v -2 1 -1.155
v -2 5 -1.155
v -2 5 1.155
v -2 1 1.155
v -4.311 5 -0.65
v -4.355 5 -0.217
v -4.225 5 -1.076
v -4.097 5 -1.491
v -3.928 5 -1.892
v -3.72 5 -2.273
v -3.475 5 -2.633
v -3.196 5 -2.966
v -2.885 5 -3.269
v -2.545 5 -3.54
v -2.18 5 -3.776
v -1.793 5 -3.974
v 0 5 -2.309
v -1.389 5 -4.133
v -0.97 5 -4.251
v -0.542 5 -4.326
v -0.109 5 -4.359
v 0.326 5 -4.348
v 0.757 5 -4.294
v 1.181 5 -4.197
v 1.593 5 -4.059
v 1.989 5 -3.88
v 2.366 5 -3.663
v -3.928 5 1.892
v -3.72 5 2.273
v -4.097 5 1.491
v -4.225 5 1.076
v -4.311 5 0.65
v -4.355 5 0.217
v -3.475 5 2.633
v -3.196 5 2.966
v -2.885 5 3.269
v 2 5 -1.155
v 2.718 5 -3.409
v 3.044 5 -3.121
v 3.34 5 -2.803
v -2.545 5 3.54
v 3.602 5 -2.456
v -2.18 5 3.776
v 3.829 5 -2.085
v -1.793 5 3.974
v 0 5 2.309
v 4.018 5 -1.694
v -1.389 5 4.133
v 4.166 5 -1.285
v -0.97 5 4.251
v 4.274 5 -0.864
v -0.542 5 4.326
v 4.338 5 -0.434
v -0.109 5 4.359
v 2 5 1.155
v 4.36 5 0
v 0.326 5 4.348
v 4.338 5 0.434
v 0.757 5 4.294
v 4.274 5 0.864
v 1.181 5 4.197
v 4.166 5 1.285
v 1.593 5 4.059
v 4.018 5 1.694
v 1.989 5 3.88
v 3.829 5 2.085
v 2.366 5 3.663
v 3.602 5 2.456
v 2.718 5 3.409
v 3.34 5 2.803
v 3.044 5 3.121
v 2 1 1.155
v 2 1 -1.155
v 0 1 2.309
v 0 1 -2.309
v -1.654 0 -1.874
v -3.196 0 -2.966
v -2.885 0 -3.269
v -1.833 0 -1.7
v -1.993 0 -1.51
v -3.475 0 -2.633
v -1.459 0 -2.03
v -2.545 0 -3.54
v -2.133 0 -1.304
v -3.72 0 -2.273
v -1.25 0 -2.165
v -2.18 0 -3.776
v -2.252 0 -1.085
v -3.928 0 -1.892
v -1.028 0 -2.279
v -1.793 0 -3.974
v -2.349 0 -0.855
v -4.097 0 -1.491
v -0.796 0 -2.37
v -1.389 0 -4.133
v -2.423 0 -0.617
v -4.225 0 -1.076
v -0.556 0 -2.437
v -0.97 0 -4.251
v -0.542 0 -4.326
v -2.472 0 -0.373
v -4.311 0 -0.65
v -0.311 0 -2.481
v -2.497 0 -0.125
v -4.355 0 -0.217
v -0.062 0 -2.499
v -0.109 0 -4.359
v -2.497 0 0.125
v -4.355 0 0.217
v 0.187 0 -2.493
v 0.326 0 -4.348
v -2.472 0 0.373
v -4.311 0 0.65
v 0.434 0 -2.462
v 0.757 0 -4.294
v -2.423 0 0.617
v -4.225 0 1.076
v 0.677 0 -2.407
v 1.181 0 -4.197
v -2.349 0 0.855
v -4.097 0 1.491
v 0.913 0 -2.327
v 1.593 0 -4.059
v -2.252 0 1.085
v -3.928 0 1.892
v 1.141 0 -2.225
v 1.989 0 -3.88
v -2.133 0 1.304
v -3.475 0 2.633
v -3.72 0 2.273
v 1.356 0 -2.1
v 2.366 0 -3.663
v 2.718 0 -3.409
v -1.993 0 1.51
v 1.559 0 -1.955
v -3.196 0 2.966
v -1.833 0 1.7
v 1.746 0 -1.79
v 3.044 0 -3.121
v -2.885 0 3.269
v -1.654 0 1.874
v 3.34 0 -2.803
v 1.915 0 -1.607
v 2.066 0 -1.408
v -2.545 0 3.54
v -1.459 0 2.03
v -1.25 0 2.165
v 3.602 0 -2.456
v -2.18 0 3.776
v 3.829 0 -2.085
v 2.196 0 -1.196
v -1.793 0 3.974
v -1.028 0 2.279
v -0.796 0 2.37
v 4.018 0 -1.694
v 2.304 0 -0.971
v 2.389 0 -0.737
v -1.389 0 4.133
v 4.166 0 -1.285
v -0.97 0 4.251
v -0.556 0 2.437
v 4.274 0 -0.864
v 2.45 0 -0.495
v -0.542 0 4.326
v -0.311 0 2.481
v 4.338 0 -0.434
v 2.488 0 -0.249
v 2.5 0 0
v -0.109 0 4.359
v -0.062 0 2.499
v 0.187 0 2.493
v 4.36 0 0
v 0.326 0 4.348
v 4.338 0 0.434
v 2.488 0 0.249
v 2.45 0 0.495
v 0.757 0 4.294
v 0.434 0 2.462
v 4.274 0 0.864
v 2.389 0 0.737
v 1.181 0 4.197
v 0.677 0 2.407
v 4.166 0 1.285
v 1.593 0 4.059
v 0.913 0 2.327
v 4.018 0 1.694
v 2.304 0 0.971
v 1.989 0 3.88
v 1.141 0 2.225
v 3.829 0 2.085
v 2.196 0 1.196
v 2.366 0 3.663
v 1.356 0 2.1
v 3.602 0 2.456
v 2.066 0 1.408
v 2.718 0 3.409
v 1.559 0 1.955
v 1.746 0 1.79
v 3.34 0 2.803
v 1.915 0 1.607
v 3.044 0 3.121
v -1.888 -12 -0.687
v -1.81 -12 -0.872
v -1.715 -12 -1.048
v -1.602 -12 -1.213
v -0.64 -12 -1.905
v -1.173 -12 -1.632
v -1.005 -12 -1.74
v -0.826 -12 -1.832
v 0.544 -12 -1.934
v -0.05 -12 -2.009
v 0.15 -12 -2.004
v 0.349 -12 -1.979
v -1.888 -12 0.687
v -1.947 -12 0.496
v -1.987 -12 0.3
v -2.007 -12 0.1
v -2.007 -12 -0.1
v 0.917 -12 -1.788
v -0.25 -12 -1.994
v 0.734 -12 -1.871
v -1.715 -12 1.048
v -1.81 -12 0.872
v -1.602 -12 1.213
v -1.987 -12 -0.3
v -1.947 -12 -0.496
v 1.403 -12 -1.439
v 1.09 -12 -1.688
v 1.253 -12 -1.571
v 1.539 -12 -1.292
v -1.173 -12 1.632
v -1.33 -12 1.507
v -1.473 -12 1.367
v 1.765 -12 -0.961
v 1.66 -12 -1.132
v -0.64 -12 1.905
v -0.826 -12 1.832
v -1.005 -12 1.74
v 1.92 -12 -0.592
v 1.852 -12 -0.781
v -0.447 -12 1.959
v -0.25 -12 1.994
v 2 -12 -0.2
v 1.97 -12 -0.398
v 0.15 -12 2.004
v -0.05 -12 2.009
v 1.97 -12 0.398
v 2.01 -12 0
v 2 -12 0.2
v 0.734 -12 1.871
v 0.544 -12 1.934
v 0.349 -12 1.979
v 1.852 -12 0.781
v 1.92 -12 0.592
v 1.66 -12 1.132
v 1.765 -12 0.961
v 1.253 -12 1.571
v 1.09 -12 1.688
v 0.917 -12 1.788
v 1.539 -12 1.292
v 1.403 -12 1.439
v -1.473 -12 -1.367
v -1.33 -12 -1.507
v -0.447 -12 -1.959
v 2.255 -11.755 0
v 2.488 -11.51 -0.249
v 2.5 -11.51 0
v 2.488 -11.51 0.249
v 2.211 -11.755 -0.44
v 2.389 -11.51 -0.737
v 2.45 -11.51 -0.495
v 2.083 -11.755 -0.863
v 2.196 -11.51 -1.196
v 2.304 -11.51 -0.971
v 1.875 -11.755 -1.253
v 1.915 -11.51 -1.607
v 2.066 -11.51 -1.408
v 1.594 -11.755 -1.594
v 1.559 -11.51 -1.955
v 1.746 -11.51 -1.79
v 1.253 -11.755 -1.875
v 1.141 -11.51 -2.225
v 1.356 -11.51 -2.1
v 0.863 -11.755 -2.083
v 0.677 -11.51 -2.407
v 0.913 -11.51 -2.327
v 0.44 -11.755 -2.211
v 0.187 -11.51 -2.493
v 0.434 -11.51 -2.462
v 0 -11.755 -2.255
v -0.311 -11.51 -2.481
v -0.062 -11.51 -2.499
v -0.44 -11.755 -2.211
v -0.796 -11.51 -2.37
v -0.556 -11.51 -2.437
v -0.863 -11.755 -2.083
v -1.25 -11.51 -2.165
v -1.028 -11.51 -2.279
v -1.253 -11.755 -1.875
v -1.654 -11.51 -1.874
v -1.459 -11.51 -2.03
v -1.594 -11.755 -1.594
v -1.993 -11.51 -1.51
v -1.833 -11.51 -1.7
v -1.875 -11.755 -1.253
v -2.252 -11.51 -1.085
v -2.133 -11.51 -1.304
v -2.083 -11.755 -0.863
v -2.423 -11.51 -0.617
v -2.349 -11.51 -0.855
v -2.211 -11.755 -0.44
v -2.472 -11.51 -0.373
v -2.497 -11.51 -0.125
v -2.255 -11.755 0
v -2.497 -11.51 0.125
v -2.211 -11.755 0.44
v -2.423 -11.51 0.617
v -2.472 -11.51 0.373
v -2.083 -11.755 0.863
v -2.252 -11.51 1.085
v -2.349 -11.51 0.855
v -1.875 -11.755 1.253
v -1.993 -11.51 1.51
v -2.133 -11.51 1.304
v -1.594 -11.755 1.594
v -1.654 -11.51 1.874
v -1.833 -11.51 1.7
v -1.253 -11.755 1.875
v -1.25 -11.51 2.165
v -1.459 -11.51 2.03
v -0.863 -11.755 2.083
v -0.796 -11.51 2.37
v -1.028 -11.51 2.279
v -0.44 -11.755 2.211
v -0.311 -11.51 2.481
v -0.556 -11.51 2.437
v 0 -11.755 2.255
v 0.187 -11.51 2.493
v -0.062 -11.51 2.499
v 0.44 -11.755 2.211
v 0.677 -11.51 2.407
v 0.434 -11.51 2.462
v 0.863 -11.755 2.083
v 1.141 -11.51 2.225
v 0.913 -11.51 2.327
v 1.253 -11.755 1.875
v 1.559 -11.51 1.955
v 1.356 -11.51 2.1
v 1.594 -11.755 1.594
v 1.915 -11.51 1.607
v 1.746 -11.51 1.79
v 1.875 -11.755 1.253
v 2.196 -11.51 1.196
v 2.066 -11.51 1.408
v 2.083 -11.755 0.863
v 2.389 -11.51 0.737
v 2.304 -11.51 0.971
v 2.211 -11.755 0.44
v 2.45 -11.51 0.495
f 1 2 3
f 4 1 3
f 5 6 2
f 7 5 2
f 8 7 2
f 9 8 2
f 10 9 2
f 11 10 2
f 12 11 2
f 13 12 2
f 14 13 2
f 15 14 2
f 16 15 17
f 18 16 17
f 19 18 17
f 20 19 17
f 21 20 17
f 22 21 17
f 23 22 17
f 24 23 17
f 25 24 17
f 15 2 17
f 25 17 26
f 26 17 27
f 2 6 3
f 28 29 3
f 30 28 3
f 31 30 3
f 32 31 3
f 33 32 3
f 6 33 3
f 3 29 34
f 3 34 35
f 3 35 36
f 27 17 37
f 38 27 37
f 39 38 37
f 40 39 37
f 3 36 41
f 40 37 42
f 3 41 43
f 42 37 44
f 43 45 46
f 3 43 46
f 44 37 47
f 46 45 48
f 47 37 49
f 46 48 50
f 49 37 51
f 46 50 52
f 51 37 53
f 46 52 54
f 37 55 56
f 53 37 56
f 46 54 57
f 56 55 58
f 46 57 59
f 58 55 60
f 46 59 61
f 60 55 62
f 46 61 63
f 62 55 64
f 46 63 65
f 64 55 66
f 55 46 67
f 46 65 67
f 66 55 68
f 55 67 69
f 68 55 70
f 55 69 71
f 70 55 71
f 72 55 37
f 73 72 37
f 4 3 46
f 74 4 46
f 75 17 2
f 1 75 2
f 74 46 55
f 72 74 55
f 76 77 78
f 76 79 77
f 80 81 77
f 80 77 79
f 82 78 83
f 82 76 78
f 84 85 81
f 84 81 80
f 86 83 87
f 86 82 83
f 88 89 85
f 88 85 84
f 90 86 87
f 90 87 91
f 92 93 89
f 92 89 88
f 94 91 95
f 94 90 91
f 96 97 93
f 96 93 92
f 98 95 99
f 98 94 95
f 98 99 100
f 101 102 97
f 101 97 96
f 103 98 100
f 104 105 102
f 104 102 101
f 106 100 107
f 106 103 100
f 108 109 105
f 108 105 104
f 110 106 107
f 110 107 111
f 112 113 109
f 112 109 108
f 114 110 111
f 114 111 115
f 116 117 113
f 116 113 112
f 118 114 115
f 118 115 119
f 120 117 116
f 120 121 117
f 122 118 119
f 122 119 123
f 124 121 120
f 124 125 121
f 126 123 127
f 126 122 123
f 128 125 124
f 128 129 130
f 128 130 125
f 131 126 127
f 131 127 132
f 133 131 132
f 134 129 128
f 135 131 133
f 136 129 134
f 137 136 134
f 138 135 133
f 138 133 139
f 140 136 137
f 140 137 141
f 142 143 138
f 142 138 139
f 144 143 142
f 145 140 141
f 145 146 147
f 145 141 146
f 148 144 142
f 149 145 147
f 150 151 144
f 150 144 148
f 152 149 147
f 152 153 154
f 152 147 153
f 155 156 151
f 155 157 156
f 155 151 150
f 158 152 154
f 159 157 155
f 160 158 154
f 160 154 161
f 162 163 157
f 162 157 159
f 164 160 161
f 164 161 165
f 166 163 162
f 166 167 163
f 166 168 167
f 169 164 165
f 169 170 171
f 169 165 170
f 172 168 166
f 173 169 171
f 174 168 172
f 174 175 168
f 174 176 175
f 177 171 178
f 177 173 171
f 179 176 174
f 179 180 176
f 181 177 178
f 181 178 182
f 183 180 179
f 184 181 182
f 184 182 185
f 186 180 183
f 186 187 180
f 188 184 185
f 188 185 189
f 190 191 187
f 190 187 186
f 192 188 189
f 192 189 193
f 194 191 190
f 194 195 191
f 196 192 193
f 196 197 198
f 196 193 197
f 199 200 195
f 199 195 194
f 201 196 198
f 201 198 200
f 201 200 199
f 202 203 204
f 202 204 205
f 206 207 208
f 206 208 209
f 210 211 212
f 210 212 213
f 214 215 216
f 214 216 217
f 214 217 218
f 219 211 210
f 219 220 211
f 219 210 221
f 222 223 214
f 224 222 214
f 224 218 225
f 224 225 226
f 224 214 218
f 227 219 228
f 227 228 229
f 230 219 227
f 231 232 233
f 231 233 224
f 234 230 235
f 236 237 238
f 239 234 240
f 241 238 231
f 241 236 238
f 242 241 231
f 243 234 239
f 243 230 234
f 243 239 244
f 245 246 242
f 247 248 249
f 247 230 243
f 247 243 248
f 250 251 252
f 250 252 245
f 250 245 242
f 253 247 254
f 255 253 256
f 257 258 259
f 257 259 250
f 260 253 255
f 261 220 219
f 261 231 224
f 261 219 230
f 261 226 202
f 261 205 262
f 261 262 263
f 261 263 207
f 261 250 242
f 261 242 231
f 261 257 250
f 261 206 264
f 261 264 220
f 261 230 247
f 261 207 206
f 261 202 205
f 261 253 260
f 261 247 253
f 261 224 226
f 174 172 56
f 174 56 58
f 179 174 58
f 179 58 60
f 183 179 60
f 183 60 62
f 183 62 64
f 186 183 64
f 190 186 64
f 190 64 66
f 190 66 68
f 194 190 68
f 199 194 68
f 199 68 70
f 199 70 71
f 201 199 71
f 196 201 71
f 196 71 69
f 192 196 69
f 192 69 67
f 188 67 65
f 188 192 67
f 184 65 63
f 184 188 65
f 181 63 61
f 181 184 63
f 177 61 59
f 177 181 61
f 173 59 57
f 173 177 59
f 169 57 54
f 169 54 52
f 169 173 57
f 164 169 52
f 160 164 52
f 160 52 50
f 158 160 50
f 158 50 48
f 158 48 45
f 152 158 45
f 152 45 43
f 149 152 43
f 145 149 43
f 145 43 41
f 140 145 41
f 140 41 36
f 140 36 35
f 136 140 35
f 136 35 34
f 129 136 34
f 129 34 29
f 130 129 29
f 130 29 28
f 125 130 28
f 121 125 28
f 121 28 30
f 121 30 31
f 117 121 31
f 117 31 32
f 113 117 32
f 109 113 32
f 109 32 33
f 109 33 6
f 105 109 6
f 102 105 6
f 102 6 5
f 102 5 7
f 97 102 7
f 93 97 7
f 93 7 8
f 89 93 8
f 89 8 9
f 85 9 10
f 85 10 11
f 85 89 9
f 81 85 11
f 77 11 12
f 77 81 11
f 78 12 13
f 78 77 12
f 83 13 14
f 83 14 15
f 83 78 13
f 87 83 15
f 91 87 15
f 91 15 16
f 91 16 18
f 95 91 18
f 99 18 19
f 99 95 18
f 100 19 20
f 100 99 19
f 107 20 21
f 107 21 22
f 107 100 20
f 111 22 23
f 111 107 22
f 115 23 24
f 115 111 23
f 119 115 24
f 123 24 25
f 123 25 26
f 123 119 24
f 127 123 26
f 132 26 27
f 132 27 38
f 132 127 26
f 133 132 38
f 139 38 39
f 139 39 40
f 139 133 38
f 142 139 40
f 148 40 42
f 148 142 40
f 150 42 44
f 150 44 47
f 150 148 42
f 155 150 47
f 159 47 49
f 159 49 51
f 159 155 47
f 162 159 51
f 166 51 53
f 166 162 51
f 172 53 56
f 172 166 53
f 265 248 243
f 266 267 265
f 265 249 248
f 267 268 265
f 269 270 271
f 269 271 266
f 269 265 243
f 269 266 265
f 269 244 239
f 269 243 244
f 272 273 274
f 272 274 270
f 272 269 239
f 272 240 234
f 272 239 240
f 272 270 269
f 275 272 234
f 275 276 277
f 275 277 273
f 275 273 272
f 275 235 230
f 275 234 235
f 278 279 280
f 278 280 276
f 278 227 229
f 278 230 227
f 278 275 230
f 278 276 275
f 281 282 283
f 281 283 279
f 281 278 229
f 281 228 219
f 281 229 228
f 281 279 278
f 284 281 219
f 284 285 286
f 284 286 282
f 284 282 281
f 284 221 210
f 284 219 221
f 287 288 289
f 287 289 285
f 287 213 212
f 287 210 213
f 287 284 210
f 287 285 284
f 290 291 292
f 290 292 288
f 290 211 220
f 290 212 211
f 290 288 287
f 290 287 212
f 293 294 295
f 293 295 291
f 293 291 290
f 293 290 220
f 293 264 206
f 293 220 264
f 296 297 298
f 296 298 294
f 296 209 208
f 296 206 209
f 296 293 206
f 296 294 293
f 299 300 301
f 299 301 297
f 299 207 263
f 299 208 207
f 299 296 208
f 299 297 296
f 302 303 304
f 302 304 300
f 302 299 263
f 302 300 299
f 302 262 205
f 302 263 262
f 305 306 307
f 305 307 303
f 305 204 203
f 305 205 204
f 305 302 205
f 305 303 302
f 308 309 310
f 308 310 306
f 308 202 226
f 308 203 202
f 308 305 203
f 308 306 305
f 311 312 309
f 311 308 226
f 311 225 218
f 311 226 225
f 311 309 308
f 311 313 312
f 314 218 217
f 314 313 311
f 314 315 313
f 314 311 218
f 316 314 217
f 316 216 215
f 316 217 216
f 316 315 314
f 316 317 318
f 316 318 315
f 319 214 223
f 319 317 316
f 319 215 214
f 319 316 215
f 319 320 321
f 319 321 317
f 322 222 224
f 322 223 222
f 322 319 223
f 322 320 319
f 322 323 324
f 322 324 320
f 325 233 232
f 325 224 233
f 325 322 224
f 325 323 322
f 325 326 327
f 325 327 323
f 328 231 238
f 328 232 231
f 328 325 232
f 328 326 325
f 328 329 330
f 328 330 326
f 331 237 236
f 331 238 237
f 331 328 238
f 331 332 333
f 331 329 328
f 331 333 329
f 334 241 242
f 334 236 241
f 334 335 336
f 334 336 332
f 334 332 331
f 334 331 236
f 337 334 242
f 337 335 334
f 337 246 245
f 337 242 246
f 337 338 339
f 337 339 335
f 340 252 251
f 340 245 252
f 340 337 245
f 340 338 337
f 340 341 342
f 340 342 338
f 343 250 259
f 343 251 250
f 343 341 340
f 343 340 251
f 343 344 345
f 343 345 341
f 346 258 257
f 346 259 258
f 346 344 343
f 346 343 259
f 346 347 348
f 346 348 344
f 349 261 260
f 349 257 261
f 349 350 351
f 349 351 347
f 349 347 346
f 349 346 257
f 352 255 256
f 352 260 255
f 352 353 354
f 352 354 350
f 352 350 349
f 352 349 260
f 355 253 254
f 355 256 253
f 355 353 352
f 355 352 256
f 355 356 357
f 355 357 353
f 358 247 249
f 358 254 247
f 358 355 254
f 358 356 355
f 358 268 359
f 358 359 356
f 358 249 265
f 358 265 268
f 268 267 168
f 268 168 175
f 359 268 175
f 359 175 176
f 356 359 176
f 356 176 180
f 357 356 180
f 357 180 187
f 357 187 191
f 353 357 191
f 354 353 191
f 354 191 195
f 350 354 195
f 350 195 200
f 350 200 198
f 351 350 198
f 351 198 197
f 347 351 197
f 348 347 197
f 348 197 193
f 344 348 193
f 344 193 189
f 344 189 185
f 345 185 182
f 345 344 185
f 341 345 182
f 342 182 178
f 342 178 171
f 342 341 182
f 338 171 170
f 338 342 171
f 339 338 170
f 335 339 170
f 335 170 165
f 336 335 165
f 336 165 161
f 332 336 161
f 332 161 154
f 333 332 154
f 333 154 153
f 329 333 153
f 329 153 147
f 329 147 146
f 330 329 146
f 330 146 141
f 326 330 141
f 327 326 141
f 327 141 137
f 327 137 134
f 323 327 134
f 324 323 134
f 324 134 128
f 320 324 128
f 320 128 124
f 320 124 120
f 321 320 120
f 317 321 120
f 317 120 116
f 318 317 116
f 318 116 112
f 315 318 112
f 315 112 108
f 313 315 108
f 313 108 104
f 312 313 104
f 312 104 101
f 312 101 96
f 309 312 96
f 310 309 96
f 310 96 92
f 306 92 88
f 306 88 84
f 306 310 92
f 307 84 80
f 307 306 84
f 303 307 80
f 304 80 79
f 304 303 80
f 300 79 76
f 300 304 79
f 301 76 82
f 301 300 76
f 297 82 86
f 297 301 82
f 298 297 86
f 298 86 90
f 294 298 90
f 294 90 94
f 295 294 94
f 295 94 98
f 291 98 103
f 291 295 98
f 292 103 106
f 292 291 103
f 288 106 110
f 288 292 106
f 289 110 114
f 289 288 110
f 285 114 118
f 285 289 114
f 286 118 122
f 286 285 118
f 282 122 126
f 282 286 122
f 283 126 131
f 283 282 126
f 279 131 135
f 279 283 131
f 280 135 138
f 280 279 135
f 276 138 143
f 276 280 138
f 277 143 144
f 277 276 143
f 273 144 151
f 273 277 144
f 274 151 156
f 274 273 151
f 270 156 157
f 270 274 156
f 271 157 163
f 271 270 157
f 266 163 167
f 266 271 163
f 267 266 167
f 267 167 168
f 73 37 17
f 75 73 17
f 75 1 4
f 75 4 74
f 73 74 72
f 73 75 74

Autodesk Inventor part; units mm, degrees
sketch "Sketch_1" plane through (0, 0, 0) normal (0, 0, 1) x (1, 0, 0)
  line L0 (0, -12) -> (0, 5)
  line L1 (0, 5) -> (4.36, 5)
  line L2 (4.36, 5) -> (4.36, 0)
  line L3 (4.36, 0) -> (2.5, 0)
  line L4 (2.5, 0) -> (2.5, -11.5095)
  line L5 (2.5, -11.5095) -> (2.0095, -12)
  line L6 (2.0095, -12) -> (0, -12)
  line L7 (0, -12) -> (0, 5)
revolve "Revolution1" add sketch "Sketch_1" angle 360 about axis through (0, -12, 0) along (0, -1, 0)
thread "Thread1" size "M5x0.8" class "6g" standard "ISO Metric profile" length 10.5095
sketch "Sketch_2" plane through (0, 5, 0) normal (0, 1, 0) x (1, 0, 0)
  line L0 (-2, -1.1547) -> (0, -2.3094)
  line L1 (0, -2.3094) -> (2, -1.1547)
  line L2 (2, -1.1547) -> (2, 1.1547)
  line L3 (2, 1.1547) -> (0, 2.3094)
  line L4 (0, 2.3094) -> (-2, 1.1547)
  line L5 (-2, 1.1547) -> (-2, -1.1547)
extrude "Extrusion1" cut sketch "Sketch_2" against normal blind 4
ref_plane "1_XY" through (0, 0, 0) normal (0, 1, 0) x (1, 0, 0)
ref_plane "1_YZ" through (0, 0, 0) normal (1, 0, 0) x (0, 0, -1)
ref_plane "1_ZX" through (0, 0, 0) normal (0, 0, -1) x (0, 1, 0)
ref_plane "2_XY" through (0, -12, 0) normal (0, 1, 0) x (1, 0, 0)
ref_plane "2_YZ" through (0, -12, 0) normal (1, 0, 0) x (0, 0, -1)
ref_plane "2_ZX" through (0, -12, 0) normal (0, 0, -1) x (0, 1, 0)
properties part number "11-5512_"
